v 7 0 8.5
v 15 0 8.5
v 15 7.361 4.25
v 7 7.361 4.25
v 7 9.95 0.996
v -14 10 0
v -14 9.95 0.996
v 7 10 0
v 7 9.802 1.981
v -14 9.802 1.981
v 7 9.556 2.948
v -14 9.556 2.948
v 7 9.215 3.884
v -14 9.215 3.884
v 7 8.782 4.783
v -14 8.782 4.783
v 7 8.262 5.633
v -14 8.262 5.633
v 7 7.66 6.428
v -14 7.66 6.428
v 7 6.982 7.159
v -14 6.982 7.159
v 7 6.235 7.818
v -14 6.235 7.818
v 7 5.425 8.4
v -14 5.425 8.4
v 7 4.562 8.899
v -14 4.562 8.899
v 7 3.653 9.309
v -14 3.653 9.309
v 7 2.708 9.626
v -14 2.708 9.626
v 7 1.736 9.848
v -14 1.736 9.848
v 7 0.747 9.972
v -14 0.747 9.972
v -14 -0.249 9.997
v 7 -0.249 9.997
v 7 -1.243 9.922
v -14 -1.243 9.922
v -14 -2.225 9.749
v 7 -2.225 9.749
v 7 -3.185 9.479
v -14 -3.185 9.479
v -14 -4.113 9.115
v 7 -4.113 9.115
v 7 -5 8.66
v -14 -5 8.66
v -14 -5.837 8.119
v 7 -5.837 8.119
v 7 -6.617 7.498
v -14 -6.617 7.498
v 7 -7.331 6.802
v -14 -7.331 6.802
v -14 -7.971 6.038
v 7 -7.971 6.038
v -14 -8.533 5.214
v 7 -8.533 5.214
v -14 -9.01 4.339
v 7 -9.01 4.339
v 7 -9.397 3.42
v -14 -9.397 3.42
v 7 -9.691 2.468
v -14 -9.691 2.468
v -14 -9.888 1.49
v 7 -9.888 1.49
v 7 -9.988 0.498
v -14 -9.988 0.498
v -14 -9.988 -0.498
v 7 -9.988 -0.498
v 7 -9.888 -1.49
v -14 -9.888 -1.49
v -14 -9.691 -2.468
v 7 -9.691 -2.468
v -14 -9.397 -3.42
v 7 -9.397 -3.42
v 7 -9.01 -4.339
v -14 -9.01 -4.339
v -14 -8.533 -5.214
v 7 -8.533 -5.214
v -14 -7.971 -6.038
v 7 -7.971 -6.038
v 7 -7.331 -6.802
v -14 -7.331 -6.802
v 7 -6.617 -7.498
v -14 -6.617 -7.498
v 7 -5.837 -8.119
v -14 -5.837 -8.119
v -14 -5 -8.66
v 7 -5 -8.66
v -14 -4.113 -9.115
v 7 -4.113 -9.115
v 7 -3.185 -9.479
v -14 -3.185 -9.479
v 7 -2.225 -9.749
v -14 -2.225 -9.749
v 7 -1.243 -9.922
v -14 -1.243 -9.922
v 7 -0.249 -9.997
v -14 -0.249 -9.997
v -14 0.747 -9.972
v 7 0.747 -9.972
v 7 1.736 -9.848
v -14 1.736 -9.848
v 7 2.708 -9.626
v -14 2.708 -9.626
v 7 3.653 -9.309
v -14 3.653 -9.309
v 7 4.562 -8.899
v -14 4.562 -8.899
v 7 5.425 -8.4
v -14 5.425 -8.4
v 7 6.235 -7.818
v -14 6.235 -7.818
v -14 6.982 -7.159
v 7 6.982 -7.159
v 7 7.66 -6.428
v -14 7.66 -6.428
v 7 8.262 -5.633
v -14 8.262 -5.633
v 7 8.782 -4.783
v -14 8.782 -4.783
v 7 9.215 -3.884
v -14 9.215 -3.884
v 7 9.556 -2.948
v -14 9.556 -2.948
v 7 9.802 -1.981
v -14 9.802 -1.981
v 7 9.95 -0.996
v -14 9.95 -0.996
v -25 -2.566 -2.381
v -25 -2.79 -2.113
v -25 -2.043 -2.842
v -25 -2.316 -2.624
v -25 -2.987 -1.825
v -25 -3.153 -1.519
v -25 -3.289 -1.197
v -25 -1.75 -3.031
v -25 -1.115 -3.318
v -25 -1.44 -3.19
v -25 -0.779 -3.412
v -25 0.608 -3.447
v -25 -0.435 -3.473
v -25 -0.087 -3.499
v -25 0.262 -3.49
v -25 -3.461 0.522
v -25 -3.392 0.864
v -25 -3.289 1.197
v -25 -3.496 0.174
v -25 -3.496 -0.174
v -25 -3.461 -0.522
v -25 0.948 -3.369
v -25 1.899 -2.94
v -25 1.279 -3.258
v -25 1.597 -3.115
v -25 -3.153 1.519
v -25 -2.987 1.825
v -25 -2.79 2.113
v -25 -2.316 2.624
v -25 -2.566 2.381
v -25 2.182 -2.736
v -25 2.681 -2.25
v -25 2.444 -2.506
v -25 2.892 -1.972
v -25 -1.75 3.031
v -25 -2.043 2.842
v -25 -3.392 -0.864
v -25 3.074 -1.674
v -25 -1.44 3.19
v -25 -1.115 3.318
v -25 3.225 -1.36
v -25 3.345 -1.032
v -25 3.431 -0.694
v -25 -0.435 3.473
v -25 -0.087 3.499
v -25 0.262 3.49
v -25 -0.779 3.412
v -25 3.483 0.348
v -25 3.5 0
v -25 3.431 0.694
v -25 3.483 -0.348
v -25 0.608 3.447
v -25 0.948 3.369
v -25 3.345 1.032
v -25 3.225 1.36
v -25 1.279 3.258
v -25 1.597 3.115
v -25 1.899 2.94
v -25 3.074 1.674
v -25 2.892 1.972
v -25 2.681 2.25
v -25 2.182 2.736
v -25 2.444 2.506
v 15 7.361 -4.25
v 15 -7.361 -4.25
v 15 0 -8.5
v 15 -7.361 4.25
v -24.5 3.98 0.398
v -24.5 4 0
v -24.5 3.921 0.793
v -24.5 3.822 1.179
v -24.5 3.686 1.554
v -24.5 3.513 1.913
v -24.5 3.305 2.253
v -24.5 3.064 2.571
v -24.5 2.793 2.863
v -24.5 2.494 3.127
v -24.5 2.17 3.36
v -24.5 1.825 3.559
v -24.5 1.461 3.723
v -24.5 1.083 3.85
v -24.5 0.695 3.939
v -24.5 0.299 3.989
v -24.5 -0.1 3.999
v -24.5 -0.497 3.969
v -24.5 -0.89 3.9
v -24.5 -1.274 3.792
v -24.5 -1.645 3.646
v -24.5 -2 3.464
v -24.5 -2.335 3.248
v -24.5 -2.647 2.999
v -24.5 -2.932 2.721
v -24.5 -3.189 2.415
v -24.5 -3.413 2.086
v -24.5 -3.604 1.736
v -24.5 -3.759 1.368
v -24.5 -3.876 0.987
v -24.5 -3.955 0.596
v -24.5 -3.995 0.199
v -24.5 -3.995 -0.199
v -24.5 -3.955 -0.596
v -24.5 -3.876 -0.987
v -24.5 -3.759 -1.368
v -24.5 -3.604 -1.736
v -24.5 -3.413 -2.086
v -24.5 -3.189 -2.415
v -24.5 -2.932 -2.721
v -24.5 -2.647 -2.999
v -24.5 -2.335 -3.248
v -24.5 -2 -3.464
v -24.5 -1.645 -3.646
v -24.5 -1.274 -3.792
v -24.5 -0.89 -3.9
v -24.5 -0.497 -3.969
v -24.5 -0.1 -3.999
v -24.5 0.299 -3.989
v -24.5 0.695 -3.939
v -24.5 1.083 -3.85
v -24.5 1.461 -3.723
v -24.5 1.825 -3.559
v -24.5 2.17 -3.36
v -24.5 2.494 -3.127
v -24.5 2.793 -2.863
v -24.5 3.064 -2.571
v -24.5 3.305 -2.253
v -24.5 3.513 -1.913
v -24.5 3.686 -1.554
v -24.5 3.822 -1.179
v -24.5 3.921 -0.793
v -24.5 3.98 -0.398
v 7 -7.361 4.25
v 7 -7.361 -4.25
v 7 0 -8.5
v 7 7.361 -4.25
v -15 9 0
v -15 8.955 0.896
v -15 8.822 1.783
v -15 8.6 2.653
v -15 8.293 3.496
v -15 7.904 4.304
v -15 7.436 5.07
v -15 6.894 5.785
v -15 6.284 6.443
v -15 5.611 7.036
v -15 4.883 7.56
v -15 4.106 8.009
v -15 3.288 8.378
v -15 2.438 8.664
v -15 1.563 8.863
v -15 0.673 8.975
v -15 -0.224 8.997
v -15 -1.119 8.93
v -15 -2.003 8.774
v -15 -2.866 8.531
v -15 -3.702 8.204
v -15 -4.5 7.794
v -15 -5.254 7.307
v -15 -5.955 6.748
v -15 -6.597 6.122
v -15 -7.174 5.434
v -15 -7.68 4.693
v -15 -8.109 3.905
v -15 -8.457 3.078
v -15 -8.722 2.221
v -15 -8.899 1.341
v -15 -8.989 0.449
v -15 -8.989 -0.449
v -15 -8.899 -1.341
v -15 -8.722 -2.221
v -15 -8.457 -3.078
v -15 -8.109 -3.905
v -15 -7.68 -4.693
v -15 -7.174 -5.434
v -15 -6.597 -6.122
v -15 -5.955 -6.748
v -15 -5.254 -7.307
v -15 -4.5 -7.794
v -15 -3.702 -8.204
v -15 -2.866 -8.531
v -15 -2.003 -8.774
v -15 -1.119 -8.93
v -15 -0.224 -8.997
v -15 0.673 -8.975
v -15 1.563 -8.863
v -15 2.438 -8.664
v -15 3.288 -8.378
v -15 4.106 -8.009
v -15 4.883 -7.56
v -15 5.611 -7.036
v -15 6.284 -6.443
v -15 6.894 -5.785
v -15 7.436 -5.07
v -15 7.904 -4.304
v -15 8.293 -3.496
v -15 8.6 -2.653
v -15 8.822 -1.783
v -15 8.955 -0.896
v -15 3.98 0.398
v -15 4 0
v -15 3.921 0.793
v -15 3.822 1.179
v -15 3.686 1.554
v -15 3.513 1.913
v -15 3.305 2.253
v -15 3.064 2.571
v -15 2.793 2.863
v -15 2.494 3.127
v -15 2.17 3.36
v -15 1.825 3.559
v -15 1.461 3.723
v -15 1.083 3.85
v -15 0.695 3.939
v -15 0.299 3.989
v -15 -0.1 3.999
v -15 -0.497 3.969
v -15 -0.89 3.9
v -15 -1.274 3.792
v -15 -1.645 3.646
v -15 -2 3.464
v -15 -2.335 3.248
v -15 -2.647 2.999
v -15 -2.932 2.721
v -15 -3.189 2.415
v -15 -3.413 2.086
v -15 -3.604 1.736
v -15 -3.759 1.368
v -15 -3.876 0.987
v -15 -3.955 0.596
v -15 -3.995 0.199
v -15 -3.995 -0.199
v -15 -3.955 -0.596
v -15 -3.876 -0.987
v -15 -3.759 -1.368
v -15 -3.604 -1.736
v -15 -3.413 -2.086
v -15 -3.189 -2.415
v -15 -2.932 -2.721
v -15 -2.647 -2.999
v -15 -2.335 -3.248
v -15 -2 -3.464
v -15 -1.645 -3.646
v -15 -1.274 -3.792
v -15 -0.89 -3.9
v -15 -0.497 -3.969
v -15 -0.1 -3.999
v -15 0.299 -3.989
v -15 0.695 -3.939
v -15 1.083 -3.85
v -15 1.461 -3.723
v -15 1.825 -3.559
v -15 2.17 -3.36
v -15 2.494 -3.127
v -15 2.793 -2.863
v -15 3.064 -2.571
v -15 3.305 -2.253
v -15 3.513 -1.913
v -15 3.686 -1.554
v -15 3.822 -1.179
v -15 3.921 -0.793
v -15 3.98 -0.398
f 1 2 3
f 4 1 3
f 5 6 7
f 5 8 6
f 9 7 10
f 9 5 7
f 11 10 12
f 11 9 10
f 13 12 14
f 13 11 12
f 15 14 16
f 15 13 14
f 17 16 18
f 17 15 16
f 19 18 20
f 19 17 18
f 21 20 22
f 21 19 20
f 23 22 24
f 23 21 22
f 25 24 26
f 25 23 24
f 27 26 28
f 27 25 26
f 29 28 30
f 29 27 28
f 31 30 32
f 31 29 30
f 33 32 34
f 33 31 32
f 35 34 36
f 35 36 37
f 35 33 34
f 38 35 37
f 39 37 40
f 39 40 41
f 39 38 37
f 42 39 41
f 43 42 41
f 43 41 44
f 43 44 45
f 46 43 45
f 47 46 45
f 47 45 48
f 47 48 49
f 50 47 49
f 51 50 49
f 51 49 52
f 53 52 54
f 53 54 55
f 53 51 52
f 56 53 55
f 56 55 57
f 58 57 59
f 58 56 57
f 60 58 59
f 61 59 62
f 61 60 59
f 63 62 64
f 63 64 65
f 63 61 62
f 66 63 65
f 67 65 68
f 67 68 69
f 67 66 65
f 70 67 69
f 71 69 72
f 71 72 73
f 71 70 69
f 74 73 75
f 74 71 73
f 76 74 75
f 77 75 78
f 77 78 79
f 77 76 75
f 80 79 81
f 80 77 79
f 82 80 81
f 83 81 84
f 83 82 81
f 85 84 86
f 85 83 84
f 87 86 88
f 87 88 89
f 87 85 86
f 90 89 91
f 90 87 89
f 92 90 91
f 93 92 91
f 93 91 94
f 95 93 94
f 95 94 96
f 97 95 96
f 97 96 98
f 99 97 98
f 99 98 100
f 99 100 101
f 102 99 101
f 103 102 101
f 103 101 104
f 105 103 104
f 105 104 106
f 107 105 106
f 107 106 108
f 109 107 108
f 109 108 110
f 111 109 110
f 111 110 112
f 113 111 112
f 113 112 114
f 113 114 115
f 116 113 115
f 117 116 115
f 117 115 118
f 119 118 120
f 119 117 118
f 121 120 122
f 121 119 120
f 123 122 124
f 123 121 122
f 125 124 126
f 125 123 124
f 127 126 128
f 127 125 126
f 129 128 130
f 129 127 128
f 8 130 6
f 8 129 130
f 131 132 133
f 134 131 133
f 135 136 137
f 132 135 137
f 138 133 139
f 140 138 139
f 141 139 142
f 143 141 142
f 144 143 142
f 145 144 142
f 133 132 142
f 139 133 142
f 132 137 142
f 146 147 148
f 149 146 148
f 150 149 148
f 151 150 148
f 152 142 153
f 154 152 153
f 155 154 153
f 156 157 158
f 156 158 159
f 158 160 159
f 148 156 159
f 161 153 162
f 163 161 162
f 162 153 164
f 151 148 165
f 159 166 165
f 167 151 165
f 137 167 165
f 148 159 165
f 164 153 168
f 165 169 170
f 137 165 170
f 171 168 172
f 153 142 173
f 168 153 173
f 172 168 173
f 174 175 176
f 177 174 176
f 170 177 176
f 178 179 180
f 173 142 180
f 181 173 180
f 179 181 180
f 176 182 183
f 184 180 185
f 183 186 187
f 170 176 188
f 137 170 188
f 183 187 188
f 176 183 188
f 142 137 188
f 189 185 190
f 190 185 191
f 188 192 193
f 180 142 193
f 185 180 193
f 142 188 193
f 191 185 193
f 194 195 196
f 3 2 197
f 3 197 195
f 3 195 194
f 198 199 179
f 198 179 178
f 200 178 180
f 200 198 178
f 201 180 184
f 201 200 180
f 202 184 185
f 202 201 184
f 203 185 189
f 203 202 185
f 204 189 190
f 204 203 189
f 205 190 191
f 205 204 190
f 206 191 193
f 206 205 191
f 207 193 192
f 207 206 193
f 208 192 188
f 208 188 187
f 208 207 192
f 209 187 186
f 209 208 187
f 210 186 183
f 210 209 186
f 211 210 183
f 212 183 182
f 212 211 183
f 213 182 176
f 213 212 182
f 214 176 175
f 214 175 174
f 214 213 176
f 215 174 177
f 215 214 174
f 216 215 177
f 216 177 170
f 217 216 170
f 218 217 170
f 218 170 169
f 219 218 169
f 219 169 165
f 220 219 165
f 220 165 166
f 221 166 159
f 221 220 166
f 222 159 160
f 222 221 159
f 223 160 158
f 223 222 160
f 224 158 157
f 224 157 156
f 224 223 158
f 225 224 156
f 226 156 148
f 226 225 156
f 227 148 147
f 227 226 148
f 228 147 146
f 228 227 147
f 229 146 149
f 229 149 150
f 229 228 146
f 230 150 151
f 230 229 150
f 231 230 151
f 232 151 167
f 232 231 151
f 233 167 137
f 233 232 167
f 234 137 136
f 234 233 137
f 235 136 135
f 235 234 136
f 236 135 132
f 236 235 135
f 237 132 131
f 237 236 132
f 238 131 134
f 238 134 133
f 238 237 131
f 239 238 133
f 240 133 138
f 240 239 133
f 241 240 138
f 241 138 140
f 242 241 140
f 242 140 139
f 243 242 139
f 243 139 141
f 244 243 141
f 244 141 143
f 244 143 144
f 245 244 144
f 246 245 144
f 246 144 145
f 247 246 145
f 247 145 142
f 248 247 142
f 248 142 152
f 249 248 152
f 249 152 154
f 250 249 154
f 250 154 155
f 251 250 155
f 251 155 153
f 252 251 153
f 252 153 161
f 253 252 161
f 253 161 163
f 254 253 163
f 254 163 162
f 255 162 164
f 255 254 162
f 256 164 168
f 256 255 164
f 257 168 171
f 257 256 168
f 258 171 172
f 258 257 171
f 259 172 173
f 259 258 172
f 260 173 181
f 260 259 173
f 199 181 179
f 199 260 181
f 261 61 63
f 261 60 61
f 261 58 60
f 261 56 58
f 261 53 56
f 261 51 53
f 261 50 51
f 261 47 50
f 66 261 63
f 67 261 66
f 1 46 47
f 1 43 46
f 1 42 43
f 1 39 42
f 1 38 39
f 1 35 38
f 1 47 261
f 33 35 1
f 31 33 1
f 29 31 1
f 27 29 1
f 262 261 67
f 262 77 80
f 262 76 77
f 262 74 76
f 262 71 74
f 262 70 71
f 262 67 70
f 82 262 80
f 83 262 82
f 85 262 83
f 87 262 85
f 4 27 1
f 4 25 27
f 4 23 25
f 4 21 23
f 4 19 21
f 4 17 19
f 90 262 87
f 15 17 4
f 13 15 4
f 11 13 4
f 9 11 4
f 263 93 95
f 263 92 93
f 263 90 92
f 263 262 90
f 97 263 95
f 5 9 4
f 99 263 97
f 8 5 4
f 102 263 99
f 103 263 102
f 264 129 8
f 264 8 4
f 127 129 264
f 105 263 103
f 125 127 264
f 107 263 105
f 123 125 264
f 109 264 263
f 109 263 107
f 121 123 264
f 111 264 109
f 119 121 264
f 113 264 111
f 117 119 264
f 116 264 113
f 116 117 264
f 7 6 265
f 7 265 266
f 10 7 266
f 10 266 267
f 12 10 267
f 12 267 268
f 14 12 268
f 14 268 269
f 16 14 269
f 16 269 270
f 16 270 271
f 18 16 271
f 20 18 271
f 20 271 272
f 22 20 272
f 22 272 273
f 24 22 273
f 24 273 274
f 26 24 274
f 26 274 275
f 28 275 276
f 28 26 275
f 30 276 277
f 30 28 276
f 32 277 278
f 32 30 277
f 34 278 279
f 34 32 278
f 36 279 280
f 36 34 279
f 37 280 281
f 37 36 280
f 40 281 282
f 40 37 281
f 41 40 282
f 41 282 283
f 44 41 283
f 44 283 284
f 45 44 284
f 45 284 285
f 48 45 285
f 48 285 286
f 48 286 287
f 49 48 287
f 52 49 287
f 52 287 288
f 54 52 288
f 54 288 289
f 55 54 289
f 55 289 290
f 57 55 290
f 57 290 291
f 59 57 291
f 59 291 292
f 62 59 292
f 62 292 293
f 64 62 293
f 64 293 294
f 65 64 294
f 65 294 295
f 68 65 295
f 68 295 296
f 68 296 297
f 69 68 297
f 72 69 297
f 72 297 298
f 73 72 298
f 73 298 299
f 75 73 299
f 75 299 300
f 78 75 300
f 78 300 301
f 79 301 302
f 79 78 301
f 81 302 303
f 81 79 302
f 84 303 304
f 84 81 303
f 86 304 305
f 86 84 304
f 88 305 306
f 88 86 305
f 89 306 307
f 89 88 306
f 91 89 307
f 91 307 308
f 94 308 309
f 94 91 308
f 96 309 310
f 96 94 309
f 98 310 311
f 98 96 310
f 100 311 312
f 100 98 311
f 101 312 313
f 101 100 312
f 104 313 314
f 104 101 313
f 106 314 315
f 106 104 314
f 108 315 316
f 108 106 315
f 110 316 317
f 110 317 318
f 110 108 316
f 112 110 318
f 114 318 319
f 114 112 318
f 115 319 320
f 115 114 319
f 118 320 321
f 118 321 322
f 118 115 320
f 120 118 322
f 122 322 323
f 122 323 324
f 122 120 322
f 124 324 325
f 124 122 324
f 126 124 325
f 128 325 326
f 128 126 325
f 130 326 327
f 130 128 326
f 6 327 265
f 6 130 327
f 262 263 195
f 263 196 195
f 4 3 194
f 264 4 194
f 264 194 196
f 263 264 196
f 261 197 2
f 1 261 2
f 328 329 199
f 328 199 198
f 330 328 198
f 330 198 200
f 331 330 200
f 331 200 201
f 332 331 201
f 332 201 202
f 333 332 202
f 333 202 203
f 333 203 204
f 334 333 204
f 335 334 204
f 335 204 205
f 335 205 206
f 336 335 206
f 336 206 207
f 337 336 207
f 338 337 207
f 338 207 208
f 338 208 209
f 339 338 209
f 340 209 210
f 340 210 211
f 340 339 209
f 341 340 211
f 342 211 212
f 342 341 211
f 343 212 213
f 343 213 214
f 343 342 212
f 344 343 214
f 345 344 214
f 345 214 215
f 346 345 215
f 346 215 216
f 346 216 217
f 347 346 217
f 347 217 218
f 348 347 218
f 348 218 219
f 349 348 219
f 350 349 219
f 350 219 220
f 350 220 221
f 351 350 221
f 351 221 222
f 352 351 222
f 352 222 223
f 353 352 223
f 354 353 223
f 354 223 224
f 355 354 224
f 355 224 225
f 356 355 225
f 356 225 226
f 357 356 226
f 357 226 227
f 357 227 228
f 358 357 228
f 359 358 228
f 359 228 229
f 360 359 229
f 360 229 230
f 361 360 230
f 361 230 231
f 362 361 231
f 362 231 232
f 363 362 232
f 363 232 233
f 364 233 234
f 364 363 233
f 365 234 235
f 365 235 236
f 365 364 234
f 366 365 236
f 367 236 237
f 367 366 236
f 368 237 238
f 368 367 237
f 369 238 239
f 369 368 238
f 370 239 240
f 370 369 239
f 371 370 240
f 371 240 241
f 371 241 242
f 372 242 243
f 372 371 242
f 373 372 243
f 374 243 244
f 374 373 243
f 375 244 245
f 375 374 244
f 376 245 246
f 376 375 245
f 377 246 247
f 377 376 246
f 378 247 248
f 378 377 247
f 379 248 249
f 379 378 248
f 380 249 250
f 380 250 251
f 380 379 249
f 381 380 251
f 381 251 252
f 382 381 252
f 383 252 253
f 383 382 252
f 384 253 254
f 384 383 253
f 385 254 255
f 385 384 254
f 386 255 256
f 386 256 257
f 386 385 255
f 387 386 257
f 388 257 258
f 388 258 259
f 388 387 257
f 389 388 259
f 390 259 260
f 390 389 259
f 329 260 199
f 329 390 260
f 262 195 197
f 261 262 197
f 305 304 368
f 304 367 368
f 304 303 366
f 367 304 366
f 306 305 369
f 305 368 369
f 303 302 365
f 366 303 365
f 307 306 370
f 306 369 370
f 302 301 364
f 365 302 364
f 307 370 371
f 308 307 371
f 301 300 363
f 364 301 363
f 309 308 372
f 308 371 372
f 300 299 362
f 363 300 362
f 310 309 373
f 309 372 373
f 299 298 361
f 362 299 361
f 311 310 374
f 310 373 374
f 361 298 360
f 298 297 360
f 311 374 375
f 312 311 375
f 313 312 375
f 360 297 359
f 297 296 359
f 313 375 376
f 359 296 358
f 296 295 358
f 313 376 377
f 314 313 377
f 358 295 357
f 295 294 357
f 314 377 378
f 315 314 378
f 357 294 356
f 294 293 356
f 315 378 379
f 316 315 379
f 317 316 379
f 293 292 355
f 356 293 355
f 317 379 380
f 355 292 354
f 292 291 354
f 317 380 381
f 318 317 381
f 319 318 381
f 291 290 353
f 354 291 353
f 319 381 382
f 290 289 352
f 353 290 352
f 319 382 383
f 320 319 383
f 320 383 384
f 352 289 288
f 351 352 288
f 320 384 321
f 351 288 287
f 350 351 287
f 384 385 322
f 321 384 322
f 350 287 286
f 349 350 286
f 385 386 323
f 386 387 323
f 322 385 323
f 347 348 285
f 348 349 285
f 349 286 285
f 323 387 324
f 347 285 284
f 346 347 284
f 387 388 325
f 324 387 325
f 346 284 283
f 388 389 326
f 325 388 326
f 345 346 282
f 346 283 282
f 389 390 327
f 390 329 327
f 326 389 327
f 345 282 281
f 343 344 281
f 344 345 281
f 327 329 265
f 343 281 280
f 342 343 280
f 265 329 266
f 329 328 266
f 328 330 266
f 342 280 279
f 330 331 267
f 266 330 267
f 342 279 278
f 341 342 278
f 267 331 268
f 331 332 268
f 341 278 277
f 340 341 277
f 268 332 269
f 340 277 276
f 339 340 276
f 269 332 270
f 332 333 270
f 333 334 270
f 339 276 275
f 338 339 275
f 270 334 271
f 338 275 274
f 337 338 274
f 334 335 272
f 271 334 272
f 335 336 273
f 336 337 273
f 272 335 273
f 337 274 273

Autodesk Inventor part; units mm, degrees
ref_plane "YZ Plane" through (0, 0, 0) normal (1, 0, 0) x (0, 1, 0)
ref_plane "XZ Plane" through (0, 0, 0) normal (0, 1, 0) x (-1, 0, 0)
ref_plane "XY Plane" through (0, 0, 0) normal (0, 0, 1) x (1, 0, 0)
sketch "Schizzo1" plane through (0, 0, 0) normal (0, 0, 1) x (1, 0, 0)
  line L0 (-25, 0) -> (42.5, 0)
  line L1 (-25, 0) -> (-25, 4)
  line L2 (-25, 4) -> (-15, 4)
  line L3 (-15, 4) -> (-15, 10)
  line L4 (-15, 10) -> (15, 10)
  line L5 (15, 10) -> (15, 0)
  point P0 (0, 0)
  point P1 (0, 0)
  point P2 (15, 4)
  point P3 (42.5, 4)
  point P4 (0, 10)
  dimension "d0" = 8
  dimension "d1" = 10
  dimension "d2" = 20
  dimension "d3" = 30
revolve "Rivoluzione1" add sketch "Schizzo1" angle 360 about axis through (-25, 0, 0) along (1, 0, 0)
chamfer "Smusso1" distance 0.5 angle 45 1 edges at (-25, -4, 0)
thread "Filettatura1" size "M8x1.25" class "6g" standard "ISO Metric profile" full length
chamfer "Smusso2" distance 1 angle 45 1 edges at (-15, -10, 0)
sketch "Schizzo2" plane through (15, 0, 0) normal (1, 0, 0) x (0, 0, -1)
  circle A0 centre (0, 0) radius 10 projected
  circle A1 centre (0, 0) radius 10
  line L0 (-8.5, 0) -> (-4.25, 7.3612)
  line L1 (-4.25, 7.3612) -> (4.25, 7.3612)
  line L2 (4.25, 7.3612) -> (8.5, 0)
  line L3 (8.5, 0) -> (4.25, -7.3612)
  line L4 (4.25, -7.3612) -> (-4.25, -7.3612)
  line L5 (-4.25, -7.3612) -> (-8.5, 0)
  point P0 (0, 0)
  point P1 (0, 0)
  point P2 (-10, 0)
  dimension "d17" = 17
extrude "Estrusione2" cut sketch "Schizzo2" against normal blind 8
properties part number "Albero cuscinetto"
